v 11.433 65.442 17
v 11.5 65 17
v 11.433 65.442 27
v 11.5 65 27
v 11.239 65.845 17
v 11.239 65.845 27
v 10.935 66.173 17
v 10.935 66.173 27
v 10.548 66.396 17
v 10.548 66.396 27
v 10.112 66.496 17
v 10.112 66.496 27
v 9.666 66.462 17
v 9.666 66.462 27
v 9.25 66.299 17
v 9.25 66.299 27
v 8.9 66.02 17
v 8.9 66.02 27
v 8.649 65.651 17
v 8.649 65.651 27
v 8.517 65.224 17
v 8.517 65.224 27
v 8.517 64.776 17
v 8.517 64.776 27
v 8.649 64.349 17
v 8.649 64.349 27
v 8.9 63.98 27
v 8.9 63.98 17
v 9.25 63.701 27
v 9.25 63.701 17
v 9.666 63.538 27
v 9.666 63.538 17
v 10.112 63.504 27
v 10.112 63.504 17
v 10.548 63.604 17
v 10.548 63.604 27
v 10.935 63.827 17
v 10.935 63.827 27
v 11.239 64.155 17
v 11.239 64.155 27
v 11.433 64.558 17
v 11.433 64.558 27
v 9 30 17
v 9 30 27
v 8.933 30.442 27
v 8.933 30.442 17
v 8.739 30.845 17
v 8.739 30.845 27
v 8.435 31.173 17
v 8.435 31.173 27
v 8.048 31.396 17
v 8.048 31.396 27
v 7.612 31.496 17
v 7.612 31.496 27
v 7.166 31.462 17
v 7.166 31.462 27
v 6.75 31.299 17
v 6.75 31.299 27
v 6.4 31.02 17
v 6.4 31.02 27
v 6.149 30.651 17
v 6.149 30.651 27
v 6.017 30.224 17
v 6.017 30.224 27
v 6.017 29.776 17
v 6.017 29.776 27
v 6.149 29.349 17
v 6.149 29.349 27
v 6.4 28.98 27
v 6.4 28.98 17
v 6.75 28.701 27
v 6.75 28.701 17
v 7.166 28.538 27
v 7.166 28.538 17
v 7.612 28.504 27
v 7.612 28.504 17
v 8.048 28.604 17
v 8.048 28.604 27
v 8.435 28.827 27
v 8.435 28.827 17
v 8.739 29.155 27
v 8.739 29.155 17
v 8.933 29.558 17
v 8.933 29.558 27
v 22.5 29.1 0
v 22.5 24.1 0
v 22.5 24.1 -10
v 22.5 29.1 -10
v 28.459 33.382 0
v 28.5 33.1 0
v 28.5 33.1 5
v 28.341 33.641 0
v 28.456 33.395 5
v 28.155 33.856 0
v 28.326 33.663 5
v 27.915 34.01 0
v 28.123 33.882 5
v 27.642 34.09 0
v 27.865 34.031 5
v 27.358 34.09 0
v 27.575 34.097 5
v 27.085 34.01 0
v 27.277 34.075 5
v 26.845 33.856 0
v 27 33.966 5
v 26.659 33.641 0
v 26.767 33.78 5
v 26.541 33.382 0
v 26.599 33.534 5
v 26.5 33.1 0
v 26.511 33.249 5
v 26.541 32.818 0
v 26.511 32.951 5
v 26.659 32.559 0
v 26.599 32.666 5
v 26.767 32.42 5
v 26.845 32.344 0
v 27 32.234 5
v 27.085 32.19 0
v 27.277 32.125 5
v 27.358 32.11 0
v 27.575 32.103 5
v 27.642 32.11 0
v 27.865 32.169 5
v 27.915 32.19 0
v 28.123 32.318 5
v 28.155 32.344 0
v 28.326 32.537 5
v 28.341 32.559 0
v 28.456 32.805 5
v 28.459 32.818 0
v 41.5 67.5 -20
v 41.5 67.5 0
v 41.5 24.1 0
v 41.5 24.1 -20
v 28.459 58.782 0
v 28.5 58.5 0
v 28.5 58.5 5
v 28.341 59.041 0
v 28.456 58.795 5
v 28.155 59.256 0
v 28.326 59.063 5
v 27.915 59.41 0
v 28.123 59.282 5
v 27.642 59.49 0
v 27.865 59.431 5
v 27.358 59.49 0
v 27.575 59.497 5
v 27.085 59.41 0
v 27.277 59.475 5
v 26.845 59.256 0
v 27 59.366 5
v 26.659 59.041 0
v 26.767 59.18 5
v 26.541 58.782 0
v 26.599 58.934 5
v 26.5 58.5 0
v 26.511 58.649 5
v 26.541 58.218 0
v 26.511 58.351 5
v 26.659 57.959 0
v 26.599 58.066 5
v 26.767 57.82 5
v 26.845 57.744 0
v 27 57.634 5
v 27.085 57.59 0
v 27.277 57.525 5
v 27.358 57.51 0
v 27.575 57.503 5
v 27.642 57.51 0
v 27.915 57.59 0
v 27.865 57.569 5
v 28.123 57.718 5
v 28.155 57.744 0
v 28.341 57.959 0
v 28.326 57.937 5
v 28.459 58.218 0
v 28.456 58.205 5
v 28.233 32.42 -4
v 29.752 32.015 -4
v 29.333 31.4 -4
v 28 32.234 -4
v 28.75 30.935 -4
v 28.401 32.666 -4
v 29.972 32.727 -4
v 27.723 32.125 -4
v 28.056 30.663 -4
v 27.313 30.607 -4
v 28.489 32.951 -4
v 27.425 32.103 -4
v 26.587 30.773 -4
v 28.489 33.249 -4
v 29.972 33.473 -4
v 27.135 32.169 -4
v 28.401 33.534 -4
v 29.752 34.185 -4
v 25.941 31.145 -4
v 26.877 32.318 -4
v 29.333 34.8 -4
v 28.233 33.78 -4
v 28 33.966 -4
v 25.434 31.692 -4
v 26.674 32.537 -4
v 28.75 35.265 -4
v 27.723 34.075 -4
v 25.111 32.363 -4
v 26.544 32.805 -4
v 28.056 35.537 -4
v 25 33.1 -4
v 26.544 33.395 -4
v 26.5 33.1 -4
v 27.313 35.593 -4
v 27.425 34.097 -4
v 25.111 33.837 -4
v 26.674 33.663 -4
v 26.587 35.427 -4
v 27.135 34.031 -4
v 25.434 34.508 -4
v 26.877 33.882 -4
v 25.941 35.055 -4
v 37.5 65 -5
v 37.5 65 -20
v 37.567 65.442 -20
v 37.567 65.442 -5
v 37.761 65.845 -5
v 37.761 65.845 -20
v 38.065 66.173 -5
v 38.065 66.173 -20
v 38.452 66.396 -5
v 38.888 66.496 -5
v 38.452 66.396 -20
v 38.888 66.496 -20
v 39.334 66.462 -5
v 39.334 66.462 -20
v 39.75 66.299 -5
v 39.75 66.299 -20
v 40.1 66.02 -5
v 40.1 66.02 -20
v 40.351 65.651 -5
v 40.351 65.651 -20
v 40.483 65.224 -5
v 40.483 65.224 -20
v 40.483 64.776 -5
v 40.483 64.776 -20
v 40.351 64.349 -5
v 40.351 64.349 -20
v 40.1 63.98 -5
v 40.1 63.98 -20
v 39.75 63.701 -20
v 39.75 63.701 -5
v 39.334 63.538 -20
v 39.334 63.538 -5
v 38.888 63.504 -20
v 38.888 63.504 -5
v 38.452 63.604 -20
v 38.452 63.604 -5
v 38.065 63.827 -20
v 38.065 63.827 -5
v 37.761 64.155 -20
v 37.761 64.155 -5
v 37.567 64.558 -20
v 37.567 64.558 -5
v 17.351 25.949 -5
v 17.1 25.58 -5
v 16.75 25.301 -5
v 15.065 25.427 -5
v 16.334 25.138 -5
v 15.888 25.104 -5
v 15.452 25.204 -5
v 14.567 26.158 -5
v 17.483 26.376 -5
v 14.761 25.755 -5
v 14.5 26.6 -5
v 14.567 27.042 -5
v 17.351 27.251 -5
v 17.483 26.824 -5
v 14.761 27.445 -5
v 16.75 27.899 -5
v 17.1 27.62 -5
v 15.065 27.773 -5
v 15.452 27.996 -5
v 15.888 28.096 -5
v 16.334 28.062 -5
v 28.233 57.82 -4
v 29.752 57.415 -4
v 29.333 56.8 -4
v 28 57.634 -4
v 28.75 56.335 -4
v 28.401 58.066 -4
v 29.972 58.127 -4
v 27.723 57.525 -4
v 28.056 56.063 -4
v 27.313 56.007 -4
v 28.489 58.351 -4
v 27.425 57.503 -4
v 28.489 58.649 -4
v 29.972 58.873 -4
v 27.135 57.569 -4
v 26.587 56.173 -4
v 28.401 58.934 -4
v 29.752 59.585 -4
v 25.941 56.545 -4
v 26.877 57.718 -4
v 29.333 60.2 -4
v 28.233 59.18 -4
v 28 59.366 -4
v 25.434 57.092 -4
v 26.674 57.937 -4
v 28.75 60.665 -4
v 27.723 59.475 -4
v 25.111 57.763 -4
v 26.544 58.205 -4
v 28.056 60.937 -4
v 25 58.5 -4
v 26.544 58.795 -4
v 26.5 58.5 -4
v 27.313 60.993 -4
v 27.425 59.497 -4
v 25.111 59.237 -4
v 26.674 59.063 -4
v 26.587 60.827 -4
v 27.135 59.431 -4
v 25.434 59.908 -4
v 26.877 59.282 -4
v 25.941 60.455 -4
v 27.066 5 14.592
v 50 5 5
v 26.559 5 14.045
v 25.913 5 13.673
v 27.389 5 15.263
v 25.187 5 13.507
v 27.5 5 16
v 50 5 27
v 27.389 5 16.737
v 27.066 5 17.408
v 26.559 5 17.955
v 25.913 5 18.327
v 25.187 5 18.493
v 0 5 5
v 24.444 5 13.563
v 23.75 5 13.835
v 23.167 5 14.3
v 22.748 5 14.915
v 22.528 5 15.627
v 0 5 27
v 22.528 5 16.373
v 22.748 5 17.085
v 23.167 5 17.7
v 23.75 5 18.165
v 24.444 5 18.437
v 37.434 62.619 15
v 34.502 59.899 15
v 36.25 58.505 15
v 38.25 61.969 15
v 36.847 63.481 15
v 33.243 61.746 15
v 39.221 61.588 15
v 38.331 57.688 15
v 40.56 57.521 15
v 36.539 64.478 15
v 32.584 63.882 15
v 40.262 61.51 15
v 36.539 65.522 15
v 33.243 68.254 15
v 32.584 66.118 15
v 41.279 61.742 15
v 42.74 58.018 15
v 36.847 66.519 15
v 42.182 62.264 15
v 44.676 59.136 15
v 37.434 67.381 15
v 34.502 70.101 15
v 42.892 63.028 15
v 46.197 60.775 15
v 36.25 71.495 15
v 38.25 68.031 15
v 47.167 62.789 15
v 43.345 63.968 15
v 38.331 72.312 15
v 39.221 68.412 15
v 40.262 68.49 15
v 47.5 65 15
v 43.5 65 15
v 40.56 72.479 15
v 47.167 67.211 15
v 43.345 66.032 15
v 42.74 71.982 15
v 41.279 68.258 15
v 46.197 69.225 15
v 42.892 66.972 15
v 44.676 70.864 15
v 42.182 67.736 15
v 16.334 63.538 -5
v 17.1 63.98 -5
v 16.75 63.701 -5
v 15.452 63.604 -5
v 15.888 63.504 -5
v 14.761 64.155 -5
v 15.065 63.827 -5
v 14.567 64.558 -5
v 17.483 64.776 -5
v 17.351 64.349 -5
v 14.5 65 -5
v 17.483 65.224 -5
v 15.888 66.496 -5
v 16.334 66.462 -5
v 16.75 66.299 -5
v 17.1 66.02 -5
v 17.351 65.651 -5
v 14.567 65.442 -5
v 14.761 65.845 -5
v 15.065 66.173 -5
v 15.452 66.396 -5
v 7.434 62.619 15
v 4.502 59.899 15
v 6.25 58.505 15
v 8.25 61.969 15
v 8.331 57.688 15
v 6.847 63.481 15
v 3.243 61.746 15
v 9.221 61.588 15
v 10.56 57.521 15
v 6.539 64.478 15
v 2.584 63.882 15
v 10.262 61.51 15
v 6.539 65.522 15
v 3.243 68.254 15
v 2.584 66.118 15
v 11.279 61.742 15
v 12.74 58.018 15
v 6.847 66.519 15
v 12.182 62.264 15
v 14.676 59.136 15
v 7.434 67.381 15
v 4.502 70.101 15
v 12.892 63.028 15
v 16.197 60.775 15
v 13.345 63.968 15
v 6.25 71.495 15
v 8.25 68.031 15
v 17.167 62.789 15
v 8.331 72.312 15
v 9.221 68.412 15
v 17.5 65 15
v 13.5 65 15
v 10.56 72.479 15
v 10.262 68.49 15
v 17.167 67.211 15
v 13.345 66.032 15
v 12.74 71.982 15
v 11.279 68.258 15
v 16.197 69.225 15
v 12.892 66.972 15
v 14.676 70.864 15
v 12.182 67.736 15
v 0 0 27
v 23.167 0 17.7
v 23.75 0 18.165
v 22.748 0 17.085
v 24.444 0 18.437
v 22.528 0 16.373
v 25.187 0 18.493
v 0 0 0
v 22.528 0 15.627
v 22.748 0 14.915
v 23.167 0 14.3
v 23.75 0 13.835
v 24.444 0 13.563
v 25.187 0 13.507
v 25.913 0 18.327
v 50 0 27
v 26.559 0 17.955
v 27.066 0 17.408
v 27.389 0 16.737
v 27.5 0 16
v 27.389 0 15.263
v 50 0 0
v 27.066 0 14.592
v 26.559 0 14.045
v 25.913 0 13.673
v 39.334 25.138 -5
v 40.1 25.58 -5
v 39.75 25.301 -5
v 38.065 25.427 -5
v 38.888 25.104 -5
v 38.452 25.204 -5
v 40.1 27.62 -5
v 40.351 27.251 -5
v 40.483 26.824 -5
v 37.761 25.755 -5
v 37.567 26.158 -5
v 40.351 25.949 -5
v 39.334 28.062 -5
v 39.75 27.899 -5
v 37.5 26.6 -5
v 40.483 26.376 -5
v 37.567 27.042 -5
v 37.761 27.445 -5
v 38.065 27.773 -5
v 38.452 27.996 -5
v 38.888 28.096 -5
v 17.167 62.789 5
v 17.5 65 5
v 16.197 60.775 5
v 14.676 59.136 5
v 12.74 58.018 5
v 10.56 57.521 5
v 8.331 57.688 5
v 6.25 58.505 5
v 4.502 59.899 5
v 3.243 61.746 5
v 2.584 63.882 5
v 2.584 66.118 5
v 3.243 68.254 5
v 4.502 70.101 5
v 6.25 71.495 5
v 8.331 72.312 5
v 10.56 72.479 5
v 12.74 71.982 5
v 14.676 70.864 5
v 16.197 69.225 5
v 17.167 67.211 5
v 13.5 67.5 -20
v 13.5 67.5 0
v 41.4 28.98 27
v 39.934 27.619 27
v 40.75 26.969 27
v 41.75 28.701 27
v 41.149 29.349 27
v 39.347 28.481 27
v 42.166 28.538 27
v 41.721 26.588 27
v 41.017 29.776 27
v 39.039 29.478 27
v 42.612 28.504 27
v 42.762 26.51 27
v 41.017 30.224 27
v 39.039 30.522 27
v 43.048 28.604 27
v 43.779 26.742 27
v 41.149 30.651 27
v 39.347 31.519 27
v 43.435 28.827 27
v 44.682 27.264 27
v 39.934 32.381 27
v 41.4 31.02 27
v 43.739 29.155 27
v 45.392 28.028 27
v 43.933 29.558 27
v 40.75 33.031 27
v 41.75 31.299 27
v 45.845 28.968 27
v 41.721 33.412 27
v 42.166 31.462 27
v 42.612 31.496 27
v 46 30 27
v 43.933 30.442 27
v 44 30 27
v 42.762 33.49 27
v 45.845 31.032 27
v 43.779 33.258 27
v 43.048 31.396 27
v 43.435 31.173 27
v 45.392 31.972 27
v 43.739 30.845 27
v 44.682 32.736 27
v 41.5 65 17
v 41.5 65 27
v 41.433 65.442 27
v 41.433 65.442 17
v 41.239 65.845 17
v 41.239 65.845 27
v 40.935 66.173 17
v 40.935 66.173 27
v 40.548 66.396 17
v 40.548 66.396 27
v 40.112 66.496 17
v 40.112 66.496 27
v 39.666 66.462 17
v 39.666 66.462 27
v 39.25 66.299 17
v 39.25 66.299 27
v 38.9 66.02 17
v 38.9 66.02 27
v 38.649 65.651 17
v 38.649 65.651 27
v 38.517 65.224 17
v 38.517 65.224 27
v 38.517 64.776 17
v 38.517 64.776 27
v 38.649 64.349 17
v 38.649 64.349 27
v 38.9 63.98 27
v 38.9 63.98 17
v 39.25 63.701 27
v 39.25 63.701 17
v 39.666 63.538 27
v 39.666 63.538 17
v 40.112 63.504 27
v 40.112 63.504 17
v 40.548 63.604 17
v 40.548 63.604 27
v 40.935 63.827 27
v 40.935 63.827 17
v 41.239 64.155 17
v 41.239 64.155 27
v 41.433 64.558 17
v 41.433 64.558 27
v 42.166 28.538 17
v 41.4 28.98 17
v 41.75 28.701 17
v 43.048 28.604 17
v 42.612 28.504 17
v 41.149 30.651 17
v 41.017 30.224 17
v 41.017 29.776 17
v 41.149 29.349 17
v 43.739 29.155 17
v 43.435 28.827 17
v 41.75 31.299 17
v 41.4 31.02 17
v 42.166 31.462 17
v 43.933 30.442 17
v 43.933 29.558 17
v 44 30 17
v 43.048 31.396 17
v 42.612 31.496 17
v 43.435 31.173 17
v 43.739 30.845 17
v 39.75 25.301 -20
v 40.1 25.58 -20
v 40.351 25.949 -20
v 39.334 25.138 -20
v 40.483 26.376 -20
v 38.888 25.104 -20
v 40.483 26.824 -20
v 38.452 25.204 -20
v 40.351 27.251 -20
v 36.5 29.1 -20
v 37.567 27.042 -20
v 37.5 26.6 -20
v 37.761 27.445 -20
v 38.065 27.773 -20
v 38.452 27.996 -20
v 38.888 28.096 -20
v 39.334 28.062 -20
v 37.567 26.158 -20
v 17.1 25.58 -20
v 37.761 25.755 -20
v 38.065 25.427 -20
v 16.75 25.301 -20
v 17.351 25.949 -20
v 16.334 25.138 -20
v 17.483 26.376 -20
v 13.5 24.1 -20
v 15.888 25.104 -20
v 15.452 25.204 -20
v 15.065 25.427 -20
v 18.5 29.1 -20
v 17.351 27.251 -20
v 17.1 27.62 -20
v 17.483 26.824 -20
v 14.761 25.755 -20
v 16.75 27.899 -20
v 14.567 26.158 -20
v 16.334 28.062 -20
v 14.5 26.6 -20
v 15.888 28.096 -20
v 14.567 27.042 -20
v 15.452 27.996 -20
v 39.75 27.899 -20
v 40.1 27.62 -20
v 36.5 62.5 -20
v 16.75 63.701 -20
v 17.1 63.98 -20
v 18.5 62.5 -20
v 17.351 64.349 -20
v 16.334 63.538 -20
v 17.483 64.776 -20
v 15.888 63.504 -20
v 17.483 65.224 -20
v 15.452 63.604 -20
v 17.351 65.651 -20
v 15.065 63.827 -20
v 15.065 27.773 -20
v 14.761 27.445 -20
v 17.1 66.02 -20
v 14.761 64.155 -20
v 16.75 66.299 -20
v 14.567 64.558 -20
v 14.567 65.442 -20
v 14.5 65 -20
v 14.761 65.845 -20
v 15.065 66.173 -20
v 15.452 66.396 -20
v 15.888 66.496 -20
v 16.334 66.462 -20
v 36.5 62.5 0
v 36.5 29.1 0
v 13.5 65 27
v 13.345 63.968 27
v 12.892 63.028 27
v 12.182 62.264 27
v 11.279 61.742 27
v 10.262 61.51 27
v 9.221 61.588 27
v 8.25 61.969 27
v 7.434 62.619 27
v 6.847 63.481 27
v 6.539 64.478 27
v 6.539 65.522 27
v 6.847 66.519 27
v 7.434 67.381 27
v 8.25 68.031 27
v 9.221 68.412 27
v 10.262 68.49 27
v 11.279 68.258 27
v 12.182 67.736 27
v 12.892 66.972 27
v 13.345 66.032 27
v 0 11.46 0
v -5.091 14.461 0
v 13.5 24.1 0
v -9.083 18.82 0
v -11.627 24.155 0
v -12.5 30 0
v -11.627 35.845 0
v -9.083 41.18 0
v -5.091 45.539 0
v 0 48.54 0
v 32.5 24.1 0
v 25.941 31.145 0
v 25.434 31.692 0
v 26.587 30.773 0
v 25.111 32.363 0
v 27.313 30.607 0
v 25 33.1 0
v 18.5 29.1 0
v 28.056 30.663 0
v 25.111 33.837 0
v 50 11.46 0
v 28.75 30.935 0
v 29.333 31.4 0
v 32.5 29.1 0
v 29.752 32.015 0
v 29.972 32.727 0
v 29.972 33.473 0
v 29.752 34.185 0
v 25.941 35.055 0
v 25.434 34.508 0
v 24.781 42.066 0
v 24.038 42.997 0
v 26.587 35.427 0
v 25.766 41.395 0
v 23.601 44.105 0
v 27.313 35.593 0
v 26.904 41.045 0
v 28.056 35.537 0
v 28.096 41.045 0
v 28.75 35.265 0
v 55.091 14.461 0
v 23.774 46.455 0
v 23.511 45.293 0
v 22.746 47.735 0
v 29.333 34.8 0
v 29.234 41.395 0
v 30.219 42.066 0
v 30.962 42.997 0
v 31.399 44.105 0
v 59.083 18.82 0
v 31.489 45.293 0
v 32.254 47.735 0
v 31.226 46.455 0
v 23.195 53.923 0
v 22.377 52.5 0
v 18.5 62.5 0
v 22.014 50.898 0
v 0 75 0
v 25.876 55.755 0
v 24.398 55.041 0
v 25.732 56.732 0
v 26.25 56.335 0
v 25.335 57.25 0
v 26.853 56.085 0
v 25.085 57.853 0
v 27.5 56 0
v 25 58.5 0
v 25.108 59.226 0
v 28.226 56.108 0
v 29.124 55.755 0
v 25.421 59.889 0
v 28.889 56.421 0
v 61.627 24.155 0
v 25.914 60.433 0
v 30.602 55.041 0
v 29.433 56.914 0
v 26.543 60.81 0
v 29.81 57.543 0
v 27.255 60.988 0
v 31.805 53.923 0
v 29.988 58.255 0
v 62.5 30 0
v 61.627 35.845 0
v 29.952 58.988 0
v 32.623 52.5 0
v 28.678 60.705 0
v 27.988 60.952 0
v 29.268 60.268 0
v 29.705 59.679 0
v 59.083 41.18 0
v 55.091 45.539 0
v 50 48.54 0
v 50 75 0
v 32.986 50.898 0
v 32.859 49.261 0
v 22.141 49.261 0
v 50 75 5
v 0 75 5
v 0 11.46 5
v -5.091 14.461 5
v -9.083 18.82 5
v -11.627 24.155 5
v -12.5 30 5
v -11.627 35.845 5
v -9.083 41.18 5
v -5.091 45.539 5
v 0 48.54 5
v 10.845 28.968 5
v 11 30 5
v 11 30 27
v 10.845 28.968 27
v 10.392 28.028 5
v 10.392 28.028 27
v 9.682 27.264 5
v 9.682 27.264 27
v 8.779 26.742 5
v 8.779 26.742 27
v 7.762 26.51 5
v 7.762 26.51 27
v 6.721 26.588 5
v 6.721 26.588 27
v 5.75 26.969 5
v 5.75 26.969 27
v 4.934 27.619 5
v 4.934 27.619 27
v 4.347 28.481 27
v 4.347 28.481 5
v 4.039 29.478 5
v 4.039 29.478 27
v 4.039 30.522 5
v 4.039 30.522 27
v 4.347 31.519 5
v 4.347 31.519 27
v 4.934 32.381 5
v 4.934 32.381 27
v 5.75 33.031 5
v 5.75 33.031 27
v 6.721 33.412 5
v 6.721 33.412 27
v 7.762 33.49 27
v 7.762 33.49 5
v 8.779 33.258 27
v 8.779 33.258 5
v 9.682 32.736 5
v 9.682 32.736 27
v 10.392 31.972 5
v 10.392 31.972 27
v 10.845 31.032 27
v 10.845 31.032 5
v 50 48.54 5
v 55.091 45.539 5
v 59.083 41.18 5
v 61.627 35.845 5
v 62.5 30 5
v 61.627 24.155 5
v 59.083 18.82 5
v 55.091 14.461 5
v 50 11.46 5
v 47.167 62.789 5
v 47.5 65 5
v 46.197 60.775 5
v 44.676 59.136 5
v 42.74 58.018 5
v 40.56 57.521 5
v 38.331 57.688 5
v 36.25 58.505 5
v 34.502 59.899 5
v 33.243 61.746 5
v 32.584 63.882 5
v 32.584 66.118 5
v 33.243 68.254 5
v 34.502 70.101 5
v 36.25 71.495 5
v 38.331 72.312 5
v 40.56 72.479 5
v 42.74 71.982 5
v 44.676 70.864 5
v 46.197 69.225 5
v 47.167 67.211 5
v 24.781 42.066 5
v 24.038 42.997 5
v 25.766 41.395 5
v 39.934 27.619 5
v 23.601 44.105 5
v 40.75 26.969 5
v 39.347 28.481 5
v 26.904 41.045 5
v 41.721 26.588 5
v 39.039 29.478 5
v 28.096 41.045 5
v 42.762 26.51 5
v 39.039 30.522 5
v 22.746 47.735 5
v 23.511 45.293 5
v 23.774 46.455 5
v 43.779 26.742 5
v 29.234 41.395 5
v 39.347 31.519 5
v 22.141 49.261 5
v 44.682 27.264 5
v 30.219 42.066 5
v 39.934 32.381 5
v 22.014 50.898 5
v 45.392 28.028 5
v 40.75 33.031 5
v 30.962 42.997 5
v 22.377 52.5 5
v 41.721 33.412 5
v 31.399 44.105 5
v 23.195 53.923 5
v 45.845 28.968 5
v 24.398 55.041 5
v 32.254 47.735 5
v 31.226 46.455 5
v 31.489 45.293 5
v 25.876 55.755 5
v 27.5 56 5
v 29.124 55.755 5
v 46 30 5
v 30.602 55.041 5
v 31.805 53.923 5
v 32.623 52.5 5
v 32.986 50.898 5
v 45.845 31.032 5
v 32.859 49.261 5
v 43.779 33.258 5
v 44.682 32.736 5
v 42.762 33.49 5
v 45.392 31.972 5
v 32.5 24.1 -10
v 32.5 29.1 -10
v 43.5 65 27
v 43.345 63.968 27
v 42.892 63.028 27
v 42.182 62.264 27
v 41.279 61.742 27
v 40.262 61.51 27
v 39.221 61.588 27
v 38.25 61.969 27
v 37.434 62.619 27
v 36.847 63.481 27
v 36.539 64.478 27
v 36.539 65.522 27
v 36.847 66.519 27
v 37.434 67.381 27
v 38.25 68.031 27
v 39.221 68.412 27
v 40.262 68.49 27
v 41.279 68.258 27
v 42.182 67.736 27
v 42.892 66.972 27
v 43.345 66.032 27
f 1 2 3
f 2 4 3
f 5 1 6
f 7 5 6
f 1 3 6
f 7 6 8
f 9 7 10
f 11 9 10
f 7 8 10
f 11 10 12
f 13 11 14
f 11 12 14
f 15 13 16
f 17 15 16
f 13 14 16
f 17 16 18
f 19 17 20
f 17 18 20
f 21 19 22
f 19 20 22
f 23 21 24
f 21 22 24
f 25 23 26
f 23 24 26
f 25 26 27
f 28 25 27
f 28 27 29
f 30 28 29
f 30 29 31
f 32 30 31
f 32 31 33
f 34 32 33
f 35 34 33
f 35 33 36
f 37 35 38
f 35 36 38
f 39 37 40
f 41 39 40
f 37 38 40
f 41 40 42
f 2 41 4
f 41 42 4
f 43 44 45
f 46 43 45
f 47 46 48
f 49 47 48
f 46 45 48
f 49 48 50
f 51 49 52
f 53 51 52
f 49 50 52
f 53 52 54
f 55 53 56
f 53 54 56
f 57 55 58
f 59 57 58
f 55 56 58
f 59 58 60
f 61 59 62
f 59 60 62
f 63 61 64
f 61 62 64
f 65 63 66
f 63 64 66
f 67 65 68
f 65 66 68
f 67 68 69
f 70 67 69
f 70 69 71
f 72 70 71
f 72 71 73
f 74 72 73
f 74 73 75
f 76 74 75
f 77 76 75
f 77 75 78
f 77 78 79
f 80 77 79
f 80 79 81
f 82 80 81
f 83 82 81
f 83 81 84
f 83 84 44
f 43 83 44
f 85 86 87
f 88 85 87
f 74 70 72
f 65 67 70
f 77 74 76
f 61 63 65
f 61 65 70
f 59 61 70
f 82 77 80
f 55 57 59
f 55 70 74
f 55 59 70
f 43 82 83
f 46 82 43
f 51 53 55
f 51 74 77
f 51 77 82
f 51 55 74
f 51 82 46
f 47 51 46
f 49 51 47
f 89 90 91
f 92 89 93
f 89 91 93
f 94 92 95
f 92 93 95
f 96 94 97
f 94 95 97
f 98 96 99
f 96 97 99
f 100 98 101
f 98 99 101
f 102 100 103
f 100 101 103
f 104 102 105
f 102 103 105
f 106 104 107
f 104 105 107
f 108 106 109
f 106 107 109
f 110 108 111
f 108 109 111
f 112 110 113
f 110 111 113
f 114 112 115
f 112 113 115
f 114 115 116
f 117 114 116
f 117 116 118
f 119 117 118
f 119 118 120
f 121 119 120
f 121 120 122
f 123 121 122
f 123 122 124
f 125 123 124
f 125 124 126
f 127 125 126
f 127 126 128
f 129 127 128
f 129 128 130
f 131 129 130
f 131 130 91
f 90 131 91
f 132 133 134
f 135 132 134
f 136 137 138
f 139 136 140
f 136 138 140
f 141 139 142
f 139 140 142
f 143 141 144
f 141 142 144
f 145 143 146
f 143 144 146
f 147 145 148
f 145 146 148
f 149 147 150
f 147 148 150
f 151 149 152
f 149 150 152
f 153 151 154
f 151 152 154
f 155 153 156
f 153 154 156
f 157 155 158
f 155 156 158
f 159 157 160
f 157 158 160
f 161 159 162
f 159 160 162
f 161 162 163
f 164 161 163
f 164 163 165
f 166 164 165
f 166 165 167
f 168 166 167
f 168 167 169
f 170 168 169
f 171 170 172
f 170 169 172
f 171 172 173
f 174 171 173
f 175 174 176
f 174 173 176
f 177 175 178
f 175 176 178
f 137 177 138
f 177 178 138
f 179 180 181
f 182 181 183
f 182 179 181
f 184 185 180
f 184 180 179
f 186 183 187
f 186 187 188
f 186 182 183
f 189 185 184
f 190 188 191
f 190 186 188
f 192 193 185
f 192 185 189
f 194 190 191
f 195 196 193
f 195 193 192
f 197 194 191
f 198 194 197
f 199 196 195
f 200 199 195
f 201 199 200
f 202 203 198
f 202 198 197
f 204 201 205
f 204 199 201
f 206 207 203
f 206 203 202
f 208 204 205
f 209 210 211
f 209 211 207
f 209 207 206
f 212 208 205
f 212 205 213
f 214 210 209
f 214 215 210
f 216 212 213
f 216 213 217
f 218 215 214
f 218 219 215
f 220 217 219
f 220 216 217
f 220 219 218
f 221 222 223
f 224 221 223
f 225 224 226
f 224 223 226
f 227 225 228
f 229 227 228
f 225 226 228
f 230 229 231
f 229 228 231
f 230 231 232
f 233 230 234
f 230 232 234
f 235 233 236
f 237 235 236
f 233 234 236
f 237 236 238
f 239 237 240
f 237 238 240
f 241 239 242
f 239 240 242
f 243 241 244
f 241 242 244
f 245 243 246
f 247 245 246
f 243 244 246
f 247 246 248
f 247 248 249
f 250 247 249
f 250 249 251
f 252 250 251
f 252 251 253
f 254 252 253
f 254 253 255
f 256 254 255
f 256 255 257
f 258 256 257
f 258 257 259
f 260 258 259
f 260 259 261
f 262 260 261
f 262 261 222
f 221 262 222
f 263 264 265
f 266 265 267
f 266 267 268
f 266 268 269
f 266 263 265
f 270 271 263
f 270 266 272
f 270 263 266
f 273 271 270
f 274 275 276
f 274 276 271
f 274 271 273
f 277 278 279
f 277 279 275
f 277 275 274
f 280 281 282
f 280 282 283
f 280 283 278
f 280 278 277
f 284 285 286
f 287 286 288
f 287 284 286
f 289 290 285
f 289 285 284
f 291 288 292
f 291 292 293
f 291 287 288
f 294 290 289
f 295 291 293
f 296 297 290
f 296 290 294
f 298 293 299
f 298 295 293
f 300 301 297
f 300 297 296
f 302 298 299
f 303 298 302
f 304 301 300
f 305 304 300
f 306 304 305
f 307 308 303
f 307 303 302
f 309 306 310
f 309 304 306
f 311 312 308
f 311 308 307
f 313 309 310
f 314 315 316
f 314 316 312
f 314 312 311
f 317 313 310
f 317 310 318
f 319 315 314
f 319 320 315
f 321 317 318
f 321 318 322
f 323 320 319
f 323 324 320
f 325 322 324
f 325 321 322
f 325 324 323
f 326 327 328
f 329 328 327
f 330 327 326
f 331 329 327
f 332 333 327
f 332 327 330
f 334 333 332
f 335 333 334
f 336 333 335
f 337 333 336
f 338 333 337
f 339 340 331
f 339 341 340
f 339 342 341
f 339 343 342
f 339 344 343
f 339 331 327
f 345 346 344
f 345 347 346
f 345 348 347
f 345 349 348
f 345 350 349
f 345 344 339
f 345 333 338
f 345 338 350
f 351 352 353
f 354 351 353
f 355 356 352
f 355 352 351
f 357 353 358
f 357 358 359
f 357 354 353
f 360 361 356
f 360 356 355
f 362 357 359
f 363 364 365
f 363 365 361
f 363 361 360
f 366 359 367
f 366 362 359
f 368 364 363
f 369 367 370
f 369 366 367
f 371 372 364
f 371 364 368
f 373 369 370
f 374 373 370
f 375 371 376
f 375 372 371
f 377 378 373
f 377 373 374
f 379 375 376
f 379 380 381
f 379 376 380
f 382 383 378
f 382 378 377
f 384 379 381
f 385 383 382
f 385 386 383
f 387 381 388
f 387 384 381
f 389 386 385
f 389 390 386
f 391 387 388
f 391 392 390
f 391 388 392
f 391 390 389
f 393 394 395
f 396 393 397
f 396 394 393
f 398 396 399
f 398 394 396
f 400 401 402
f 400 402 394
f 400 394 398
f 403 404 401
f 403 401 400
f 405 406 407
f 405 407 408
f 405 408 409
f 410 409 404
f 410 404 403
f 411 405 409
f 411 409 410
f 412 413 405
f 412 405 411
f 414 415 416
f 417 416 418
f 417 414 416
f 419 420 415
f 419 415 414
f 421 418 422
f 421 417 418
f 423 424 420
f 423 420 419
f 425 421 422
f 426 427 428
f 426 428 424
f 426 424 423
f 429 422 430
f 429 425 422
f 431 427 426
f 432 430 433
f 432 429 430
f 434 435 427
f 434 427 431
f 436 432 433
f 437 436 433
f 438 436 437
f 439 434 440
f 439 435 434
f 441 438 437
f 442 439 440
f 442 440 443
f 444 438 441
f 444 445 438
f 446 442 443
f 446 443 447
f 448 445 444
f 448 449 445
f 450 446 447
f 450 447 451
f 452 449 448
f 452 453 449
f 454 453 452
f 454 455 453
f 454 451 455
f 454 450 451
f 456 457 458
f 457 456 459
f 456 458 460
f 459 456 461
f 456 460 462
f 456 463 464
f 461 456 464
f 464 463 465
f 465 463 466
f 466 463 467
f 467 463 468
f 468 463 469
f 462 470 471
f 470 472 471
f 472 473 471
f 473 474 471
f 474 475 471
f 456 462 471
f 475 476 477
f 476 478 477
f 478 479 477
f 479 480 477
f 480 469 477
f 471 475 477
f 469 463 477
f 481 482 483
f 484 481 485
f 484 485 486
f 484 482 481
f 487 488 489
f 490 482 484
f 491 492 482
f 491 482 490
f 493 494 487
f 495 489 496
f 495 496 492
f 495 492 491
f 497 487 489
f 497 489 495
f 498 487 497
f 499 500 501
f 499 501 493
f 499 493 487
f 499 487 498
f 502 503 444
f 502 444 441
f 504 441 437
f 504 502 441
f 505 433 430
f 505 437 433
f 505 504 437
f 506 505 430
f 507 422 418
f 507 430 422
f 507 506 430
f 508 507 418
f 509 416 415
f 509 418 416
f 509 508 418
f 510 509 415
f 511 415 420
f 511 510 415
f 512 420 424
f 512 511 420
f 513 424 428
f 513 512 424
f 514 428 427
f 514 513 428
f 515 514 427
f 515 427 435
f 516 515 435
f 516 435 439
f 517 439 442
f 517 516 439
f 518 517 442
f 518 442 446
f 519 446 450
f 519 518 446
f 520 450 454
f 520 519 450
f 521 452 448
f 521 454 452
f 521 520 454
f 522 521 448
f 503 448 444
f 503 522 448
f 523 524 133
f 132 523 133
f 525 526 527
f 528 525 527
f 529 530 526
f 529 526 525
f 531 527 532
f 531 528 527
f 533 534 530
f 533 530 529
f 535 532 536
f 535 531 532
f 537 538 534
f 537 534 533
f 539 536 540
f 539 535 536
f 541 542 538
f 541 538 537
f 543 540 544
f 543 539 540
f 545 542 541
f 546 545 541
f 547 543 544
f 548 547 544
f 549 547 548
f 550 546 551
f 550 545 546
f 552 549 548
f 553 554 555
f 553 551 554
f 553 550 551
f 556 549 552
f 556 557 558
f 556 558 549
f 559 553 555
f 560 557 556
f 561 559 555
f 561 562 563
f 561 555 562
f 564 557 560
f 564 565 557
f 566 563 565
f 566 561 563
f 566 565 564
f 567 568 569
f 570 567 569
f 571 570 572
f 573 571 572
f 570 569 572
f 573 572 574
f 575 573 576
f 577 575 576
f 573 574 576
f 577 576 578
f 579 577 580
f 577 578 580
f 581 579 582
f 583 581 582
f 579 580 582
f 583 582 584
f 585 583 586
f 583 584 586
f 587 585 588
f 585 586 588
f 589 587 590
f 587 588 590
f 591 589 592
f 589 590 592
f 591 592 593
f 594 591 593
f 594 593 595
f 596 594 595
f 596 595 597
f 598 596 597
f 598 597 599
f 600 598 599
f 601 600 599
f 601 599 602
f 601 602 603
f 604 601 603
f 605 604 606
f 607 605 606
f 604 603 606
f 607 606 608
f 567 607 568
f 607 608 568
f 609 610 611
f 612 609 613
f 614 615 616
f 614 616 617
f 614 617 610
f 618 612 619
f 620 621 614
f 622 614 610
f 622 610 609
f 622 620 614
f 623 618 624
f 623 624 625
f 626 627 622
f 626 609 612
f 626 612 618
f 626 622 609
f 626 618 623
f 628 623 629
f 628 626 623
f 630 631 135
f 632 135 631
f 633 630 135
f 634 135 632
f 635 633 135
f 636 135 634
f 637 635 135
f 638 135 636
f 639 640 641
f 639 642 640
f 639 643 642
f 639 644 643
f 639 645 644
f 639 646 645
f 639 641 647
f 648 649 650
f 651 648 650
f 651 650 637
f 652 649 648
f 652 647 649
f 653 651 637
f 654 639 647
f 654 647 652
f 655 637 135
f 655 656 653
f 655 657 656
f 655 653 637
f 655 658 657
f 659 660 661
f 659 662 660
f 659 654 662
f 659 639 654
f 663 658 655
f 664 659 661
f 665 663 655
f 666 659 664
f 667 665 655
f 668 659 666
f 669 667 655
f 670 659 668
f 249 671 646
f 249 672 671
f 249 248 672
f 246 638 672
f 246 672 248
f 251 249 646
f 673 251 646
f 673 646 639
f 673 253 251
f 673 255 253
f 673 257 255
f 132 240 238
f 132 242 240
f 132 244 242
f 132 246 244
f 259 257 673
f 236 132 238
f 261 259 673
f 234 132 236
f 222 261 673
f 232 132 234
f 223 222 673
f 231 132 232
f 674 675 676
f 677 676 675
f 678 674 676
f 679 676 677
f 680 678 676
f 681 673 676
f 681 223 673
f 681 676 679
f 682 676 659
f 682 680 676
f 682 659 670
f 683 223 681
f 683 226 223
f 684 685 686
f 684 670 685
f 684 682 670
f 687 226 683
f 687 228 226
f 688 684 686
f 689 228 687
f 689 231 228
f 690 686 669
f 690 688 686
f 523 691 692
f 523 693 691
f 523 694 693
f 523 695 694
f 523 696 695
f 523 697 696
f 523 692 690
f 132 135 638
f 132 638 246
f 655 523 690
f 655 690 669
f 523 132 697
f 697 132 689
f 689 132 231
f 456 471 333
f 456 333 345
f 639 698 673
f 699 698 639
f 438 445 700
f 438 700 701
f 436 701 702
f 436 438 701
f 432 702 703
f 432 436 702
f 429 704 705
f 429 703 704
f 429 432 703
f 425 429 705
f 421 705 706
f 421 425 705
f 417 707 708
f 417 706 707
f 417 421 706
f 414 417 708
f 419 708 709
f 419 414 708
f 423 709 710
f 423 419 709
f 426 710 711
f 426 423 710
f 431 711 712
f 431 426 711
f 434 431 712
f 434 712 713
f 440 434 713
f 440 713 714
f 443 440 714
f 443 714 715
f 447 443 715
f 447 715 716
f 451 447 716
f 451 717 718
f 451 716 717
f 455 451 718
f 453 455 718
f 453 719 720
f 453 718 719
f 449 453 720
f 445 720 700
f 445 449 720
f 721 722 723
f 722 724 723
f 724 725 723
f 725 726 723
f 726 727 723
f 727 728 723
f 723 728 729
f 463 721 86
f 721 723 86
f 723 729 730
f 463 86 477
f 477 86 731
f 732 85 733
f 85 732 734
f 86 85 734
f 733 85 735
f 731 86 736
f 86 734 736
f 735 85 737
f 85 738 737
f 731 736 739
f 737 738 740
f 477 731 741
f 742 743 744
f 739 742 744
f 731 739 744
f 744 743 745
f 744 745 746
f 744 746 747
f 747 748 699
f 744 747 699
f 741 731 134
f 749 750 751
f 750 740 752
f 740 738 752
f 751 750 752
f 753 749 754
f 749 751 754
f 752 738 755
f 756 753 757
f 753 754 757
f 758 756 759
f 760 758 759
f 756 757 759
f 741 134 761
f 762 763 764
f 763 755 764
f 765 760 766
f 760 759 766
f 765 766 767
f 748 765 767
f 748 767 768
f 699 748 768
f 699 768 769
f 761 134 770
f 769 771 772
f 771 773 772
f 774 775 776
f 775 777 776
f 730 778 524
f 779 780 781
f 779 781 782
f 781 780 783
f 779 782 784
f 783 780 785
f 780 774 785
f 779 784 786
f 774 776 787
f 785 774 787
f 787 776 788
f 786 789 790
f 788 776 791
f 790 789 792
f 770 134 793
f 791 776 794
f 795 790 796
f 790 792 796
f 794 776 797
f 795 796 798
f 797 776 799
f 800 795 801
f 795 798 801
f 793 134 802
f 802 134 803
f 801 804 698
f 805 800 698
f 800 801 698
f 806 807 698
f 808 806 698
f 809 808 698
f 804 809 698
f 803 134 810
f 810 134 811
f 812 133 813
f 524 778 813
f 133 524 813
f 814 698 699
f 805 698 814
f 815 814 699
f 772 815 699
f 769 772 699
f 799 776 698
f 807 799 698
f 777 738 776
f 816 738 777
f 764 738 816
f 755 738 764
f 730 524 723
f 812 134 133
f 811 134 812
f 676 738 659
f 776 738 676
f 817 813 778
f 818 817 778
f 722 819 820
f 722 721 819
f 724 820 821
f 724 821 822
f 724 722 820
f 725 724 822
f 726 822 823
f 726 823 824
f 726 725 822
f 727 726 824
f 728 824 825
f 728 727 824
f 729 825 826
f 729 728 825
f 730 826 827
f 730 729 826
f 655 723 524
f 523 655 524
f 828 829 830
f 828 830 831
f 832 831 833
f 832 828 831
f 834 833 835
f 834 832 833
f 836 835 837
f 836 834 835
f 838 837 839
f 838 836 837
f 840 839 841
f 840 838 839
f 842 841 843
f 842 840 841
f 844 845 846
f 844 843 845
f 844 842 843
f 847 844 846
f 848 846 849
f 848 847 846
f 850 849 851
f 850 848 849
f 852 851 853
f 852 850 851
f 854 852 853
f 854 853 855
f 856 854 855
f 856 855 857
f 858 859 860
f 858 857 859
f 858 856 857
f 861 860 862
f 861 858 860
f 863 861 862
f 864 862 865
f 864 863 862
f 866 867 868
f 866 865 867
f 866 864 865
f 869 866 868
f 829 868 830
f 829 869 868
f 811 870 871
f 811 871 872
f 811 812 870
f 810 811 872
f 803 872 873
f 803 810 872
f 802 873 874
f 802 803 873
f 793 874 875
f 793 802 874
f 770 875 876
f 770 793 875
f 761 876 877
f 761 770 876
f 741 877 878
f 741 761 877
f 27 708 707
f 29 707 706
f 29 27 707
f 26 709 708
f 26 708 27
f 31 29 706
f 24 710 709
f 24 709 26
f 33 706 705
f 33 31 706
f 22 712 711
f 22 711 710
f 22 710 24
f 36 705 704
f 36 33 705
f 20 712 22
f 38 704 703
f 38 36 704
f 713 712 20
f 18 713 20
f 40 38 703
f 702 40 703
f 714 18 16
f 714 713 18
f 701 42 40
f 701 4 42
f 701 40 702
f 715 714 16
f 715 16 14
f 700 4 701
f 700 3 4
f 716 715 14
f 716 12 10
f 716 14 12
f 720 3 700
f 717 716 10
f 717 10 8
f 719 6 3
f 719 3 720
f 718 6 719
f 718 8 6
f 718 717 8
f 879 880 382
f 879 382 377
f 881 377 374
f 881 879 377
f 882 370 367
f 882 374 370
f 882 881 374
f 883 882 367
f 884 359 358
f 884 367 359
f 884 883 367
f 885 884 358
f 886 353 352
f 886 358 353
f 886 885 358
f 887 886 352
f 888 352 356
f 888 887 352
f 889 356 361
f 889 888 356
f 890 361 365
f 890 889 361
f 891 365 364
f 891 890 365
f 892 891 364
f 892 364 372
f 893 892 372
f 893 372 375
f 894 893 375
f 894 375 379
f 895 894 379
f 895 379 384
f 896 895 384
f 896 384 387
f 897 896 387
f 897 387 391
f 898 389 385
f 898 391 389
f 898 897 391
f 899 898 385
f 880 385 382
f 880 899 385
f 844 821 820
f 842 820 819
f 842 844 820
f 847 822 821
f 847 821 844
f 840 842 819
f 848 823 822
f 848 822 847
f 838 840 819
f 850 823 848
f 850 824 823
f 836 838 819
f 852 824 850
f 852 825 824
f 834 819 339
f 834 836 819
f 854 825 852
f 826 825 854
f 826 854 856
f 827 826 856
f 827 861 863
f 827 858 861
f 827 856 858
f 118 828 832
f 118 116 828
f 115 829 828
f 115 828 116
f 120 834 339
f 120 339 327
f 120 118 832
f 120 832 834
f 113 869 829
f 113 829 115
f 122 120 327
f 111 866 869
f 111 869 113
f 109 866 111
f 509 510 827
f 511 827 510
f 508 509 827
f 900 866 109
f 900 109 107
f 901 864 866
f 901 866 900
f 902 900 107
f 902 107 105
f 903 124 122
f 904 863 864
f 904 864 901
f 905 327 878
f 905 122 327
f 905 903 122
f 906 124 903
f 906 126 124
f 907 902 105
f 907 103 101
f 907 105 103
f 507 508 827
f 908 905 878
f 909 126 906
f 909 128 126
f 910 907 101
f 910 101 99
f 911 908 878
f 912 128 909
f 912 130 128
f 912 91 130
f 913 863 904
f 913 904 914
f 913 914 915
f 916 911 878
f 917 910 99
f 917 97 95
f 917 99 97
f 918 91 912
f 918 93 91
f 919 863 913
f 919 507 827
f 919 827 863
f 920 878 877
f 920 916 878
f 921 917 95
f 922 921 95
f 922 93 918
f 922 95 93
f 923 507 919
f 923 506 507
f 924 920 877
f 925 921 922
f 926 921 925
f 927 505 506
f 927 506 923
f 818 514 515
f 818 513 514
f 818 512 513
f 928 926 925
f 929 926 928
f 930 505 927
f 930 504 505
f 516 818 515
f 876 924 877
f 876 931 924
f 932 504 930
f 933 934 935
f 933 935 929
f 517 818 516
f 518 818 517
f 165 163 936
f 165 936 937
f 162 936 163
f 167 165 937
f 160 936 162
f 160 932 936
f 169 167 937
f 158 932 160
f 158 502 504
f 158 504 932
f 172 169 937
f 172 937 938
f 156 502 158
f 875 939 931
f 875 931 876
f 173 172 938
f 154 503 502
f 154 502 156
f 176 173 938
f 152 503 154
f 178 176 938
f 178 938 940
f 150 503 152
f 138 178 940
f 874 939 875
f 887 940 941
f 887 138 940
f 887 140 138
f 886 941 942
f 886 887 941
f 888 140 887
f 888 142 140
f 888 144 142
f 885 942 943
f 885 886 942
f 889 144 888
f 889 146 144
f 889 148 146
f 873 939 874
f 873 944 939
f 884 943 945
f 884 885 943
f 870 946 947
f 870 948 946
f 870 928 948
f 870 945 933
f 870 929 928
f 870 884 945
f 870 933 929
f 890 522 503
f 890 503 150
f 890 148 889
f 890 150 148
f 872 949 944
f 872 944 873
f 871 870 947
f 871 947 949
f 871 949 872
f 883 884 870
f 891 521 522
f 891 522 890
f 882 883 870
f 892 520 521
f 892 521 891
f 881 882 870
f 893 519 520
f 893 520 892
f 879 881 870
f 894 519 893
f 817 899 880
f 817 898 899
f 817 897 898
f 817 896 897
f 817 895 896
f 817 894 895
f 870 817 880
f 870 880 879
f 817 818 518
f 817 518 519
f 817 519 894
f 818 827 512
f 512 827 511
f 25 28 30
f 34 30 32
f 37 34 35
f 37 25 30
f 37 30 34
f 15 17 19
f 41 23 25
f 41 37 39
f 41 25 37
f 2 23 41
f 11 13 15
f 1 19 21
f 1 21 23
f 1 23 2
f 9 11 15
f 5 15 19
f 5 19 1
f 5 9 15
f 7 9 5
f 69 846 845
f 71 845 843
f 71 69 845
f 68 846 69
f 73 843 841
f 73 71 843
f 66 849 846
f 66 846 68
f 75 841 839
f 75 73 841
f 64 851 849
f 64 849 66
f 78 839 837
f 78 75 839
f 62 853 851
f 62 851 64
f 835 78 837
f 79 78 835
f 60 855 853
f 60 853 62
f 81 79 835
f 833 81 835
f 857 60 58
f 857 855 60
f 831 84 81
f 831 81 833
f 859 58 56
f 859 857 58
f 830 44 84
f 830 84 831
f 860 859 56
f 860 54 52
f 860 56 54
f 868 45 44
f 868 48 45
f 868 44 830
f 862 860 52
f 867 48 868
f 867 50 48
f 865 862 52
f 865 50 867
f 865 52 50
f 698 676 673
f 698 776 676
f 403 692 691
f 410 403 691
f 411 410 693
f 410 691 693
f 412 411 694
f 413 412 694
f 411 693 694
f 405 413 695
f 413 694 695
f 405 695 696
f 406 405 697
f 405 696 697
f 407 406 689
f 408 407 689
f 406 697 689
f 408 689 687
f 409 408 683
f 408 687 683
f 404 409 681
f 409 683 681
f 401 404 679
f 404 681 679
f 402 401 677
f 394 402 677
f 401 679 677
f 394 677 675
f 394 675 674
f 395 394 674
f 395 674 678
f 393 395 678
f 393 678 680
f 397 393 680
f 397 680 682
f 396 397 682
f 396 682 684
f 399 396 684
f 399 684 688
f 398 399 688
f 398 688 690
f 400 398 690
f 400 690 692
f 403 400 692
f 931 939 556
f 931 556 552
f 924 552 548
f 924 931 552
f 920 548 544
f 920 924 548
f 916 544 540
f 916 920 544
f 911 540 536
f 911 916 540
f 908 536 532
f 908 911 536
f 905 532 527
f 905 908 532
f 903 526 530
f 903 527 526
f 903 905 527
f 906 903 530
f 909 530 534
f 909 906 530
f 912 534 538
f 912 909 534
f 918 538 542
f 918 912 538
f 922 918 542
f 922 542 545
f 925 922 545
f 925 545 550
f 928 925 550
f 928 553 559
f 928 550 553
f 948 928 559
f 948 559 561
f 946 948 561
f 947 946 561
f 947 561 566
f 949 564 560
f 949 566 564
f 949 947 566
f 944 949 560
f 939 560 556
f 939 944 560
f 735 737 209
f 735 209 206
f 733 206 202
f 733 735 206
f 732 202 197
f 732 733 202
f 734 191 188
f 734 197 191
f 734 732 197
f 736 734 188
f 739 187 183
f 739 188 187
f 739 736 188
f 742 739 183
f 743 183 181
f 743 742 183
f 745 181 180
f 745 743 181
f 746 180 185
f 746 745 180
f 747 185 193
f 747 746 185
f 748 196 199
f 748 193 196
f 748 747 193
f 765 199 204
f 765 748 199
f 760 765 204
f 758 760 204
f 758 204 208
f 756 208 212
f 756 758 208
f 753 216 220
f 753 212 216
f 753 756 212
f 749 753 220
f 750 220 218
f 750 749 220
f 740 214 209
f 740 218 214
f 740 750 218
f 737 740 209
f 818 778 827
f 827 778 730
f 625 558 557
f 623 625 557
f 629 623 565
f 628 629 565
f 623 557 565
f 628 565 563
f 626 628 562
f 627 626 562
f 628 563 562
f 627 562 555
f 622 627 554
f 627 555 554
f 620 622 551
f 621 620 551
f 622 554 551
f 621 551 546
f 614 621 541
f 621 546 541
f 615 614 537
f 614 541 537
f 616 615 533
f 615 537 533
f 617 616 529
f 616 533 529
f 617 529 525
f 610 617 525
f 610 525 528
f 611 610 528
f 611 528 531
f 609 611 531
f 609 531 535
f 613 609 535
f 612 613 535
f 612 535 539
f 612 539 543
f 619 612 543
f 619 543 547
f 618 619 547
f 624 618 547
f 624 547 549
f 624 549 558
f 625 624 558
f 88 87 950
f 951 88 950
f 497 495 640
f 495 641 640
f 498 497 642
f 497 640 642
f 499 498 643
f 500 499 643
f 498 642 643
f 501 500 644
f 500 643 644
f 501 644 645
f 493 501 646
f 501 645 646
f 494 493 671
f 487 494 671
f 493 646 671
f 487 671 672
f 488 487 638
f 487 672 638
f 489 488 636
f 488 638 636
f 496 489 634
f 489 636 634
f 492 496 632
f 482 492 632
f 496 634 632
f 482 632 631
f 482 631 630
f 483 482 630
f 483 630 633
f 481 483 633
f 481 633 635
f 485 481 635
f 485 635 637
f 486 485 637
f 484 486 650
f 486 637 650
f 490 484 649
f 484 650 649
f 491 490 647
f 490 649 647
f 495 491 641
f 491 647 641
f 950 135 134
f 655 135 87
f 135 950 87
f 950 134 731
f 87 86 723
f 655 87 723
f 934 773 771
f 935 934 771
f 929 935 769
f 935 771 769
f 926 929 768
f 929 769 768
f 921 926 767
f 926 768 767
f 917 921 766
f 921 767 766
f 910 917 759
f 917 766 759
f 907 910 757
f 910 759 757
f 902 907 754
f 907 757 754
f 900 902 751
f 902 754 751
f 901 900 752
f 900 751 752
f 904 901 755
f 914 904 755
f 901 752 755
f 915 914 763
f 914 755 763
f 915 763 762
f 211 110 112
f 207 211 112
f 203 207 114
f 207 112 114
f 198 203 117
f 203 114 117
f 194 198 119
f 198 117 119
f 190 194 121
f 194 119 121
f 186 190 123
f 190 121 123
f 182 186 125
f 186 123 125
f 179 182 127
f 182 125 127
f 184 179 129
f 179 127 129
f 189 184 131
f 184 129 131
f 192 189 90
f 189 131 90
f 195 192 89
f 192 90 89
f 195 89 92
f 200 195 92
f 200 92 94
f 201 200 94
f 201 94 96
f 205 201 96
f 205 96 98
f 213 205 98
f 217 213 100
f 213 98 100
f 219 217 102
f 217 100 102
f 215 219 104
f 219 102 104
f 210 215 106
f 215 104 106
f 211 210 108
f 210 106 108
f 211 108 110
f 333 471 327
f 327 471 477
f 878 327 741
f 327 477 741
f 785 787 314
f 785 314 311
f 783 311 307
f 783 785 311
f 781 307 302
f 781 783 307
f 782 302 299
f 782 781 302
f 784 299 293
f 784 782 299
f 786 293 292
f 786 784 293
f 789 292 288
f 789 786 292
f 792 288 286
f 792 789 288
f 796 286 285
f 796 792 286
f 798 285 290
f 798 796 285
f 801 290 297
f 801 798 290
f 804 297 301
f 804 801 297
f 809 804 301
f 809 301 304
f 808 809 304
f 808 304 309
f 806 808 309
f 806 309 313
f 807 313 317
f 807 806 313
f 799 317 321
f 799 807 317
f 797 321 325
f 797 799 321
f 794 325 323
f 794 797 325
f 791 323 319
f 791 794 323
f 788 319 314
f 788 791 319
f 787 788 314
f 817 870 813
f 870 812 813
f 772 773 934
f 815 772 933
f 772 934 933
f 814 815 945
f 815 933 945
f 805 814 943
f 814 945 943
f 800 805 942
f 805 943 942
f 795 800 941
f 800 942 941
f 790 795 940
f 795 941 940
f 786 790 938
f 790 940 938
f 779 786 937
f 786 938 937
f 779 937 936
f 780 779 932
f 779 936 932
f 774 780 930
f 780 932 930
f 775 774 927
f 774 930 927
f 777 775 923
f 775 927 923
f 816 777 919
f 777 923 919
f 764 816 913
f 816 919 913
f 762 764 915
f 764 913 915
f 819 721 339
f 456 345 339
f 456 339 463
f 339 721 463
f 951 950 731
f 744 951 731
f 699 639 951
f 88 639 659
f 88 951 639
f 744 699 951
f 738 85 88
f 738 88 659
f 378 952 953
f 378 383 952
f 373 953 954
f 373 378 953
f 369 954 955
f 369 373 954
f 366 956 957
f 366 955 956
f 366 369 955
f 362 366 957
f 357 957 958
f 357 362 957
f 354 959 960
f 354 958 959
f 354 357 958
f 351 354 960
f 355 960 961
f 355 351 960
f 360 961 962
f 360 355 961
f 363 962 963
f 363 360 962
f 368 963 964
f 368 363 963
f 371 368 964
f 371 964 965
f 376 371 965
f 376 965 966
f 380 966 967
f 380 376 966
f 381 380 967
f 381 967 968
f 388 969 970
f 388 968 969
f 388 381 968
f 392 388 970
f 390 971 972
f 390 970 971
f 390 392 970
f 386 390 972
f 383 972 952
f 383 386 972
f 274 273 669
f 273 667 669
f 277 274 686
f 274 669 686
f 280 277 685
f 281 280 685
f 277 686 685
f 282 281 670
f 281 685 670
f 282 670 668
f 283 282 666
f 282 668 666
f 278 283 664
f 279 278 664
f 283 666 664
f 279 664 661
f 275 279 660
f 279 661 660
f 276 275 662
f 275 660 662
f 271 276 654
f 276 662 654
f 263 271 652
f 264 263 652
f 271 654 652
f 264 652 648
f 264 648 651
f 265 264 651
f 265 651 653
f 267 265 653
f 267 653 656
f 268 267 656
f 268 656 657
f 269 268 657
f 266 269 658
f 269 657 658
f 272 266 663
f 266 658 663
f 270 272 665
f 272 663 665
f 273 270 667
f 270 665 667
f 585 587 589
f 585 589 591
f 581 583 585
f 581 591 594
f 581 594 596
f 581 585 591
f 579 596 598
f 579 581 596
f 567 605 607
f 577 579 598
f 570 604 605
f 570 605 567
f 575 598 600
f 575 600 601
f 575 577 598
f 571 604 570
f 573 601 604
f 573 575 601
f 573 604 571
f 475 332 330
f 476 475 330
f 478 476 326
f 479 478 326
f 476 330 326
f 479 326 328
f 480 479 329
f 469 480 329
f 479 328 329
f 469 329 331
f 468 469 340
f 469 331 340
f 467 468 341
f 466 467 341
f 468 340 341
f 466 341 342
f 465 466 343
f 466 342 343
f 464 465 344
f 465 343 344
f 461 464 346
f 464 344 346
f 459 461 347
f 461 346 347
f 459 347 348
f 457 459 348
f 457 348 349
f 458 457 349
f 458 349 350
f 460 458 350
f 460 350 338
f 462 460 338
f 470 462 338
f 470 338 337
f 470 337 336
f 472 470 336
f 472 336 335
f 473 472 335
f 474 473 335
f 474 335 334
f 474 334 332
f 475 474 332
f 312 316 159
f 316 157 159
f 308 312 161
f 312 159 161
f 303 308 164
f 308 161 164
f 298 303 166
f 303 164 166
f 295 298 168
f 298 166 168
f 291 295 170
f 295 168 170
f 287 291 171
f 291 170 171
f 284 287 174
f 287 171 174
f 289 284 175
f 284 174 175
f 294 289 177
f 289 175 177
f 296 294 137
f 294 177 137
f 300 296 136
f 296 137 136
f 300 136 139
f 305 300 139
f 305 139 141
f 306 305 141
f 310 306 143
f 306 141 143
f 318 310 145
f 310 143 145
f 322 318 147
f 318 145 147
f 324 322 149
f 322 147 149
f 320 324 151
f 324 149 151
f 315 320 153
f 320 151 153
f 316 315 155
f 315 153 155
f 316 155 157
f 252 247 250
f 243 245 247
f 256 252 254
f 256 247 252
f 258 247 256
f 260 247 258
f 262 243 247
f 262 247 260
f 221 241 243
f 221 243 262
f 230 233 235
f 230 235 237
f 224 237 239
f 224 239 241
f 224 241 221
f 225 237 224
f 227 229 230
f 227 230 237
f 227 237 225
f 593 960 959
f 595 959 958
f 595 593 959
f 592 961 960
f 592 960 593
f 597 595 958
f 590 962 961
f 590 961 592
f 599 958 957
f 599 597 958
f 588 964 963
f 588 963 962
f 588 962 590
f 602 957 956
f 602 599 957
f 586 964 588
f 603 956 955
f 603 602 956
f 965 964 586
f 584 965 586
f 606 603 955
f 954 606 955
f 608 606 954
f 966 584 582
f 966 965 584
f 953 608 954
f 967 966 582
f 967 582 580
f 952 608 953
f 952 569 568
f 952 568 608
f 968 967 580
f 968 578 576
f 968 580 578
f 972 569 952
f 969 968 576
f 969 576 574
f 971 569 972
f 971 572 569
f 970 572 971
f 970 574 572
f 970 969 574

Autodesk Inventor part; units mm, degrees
ref_plane "YZ Plane" through (0, 0, 0) normal (1, 0, 0) x (0, 1, 0)
ref_plane "XZ Plane" through (0, 0, 0) normal (0, 1, 0) x (-1, 0, 0)
ref_plane "XY Plane" through (0, 0, 0) normal (0, 0, 1) x (1, 0, 0)
sketch "Sketch1" plane through (0, 0, 0) normal (0, 0, 1) x (1, 0, 0)
  line L0 (0, 0) -> (50, 0)
  line L1 (50, 0) -> (50, 75)
  line L2 (50, 75) -> (0, 75)
  line L3 (0, 75) -> (0, 0)
  dimension "d0" = 50
  dimension "d1" = 75
extrude "Extrusion1" add sketch "Sketch1" along normal blind 5
sketch "Sketch2" plane through (0, 0, 0) normal (0, 1, 0) x (-1, 0, 0)
  line L0 (0, 5) -> (-50, 5) projected
  line L1 (0, 5) -> (-50, 5)
  line L2 (-50, 5) -> (-50, 27)
  line L3 (-50, 27) -> (0, 27)
  line L4 (0, 27) -> (0, 5)
  point P0 (0, 0)
  dimension "d4" = 22
extrude "Extrusion2" add sketch "Sketch2" along normal blind 5
sketch "Sketch3" plane through (0, 0, 5) normal (0, 0, 1) x (1, 0, 0)
  circle A0 centre (42.5, 30) radius 3.5
  circle A1 centre (40, 65) radius 3.5
  circle A2 centre (10, 65) radius 3.5
  circle A3 centre (7.5, 30) radius 3.5
  line L0 (42.5, 30) -> (7.5, 30) construction
  line L1 (50, 75) -> (0, 75) construction
  line L2 (25, 75) -> (25, 30) construction
  line L3 (10, 65) -> (40, 65) construction
  point P0 (0, 0)
  point P1 (25, 65)
  dimension "d7" = 7
  dimension "d8" = 7
  dimension "d9" = 7
  dimension "d10" = 7
  dimension "d12" = 30
  dimension "d14" = 10
  dimension "d30" = 35
  dimension "d32" = 35
extrude "Extrusion3" add sketch "Sketch3" along normal blind 22
sketch "Sketch4" plane through (40, 65, 27) normal (0, 0, 1) x (1, 0, 0)
  circle A0 centre (-30, 0) radius 3.5 projected
  circle A1 centre (0, 0) radius 3.5 projected
  circle A2 centre (2.5, -35) radius 3.5 projected
  circle A3 centre (-32.5, -35) radius 3.5 projected
  circle A4 centre (-30, 0) radius 1.5
  circle A5 centre (0, 0) radius 1.5
  circle A6 centre (2.5, -35) radius 1.5
  circle A7 centre (-32.5, -35) radius 1.5
  point P0 (-40, -65)
  dimension "d17" = 3
  dimension "d18" = 3
  dimension "d19" = 3
  dimension "d20" = 3
extrude "Extrusion4" cut sketch "Sketch4" against normal blind 10 contours A4 | A5 | A6 | A7
sketch "Sketch5" plane through (0, 5, 0) normal (0, 1, 0) x (1, 0, 0)
  circle A0 centre (25, -16) radius 2.5
  line L0 (0, -5) -> (50, -5) projected
  line L1 (0, -5) -> (0, -27) projected
  line L2 (0, -27) -> (50, -27) projected
  line L3 (50, -27) -> (50, -5) projected
  point P0 (0, 0)
  point P1 (0, -16)
  point P2 (25, -27)
  dimension "d23" = 5
extrude "Extrusion5" cut sketch "Sketch5" against normal through all contours A0
sketch "Sketch6" plane through (0, 0, 5) normal (0, 0, 1) x (1, 0, 0)
  circle A0 centre (10, 65) radius 3.5 projected
  circle A1 centre (40, 65) radius 3.5 projected
  circle A2 centre (10, 65) radius 1.5 projected
  circle A3 centre (10, 65) radius 7.5
  circle A4 centre (40, 65) radius 7.5
  point P0 (0, 0)
  dimension "d26" = 15
  dimension "d27" = 15
extrude "Extrusion6" add sketch "Sketch6" along normal blind 10 contours A3 | A4
sketch "Sketch8" plane through (0, 0, 0) normal (0, 0, -1) x (-1, 0, 0)
  circle A0 centre (-42.5, 30) radius 1.5 projected
  circle A1 centre (-42.5, 30) radius 20
  circle A2 centre (-7.5, 30) radius 3.5 projected
  circle A3 centre (-7.5, 30) radius 20
  point P0 (0, 0)
  dimension "d33" = 40
  dimension "d34" = 40
extrude "Extrusion7" add sketch "Sketch8" against normal blind 5 contours A1 A3 | A1 A3 | A3 A1 | A2
sketch "Sketch9" plane through (0, 0, 5) normal (0, 0, 1) x (1, 0, 0)
  circle A0 centre (27.5, 50.5) radius 5.5
  line L0 (50, 75) -> (0, 75) projected
  line L1 (50, 75) -> (0, 75) construction
  line L2 (25, 75) -> (25, 35.564) construction
  point P0 (0, 0)
  dimension "d37" = 11
  dimension "d38" = 24.5
  dimension "d39" = 2.5
extrude "Extrusion8" cut sketch "Sketch9" against normal through all
sketch "Sketch10" plane through (0, 0, 5) normal (0, 0, 1) x (1, 0, 0)
  circle A0 centre (27.5, 58.5) radius 1
  circle A1 centre (27.5, 33.1) radius 1
  line L0 (27.5, 58.5) -> (27.5, 33.1) construction
  circle A2 centre (27.5, 50.5) radius 5.5 projected
  point P0 (0, 0)
  dimension "d42" = 2
  dimension "d43" = 2
  dimension "d44" = 25.4
  dimension "d45" = 8
extrude "Extrusion9" cut sketch "Sketch10" against normal through all contours A0 | A1
sketch "Sketch11" plane through (0, 0, 0) normal (0, 0, -1) x (-1, 0, 0)
  circle A0 centre (-27.5, 58.5) radius 1 projected
  circle A1 centre (-27.5, 33.1) radius 1 projected
  circle A2 centre (-27.5, 58.5) radius 2.5
  circle A3 centre (-27.5, 33.1) radius 2.5
  point P0 (0, 0)
  dimension "d48" = 1.5
  dimension "d49" = 1.5
extrude "Extrusion10" add sketch "Sketch11" along normal blind 4
sketch "Sketch12" plane through (0, 0, 0) normal (0, 0, -1) x (-1, 0, 0)
  line L0 (-36.5, 29.1) -> (-18.5, 29.1)
  line L1 (-18.5, 29.1) -> (-18.5, 62.5)
  line L2 (-18.5, 62.5) -> (-36.5, 62.5)
  line L3 (-36.5, 62.5) -> (-36.5, 29.1)
  circle A0 centre (-27.5, 50.5) radius 5.5 projected
  line L4 (-50, 75) -> (0, 75) projected
  line L5 (-41.5, 24.1) -> (-13.5, 24.1)
  line L6 (-13.5, 24.1) -> (-13.5, 67.5)
  line L7 (-13.5, 67.5) -> (-41.5, 67.5)
  line L8 (-41.5, 67.5) -> (-41.5, 24.1)
  circle A1 centre (-27.5, 58.5) radius 1 projected
  circle A2 centre (-27.5, 33.1) radius 1 projected
  point P0 (0, 0)
  point P1 (-26.1358, 55.8281)
  point P2 (-28.8642, 55.8281)
  point P3 (-27.5, 62.5)
  dimension "d52" = 18
  dimension "d55" = 5
  dimension "d58" = 4
  dimension "d59" = 4
extrude "Extrusion11" add sketch "Sketch12" along normal blind 20 contours L8 L7 L6 L5
sketch "Sketch13" plane through (0, 0, -20) normal (0, 0, -1) x (-1, 0, 0)
  line L0 (-36.5, 29.1) -> (-36.5, 62.5) construction
  line L1 (-36.5, 62.5) -> (-18.5, 62.5) construction
  line L2 (-18.5, 62.5) -> (-18.5, 29.1) construction
  line L3 (-18.5, 29.1) -> (-36.5, 29.1) construction
  line L4 (-41.5, 24.1) -> (-13.5, 24.1) construction
  line L5 (-13.5, 24.1) -> (-13.5, 67.5) construction
  line L6 (-13.5, 67.5) -> (-41.5, 67.5) construction
  line L7 (-41.5, 67.5) -> (-41.5, 24.1) construction
  line L8 (-39, 65) -> (-16, 65) construction
  line L9 (-16, 65) -> (-16, 26.6) construction
  line L10 (-16, 26.6) -> (-39, 26.6) construction
  line L11 (-39, 26.6) -> (-39, 65) construction
  circle A0 centre (-39, 65) radius 1.5
  circle A1 centre (-16, 65) radius 1.5
  circle A2 centre (-16, 26.6) radius 1.5
  circle A3 centre (-39, 26.6) radius 1.5
  point P0 (0, 0)
  dimension "d60" = 2.5
  dimension "d61" = 3
  dimension "d62" = 3
  dimension "d63" = 3
  dimension "d64" = 3
extrude "Extrusion12" cut sketch "Sketch13" against normal blind 15
sketch "Sketch14" plane through (13.5, 24.1, 0) normal (0, -1, 0) x (1, 0, 0)
  line L0 (28, 0) -> (0, 0) projected
  line L1 (19, 0) -> (9, 0)
  line L2 (9, 0) -> (9, -10)
  line L3 (9, -10) -> (19, -10)
  line L4 (19, -10) -> (19, 0)
  line L5 (0, 0) -> (28, 0) projected
  point P0 (-13.5, 0)
  point P1 (14, 0)
  dimension "d67" = 10
  dimension "d68" = 10
extrude "Extrusion13" cut sketch "Sketch14" against normal blind 5
sketch "Sketch15" plane through (0, 0, 0) normal (0, 0, -1) x (-1, 0, 0)
  circle A0 centre (-27.5, 50.5) radius 5.5 projected
  circle A1 centre (-27.5, 45) radius 4
  point P0 (0, 0)
  dimension "d71" = 8
extrude "Extrusion14" cut sketch "Sketch15" against normal through all contours A1 A0 | A0 A1 picked at (-26.7332, 46.3513) picked at (-26.5311, 43.8278)
equation "\"d49\" = d48"
properties part number "GA001" material "ABS Plastic"
